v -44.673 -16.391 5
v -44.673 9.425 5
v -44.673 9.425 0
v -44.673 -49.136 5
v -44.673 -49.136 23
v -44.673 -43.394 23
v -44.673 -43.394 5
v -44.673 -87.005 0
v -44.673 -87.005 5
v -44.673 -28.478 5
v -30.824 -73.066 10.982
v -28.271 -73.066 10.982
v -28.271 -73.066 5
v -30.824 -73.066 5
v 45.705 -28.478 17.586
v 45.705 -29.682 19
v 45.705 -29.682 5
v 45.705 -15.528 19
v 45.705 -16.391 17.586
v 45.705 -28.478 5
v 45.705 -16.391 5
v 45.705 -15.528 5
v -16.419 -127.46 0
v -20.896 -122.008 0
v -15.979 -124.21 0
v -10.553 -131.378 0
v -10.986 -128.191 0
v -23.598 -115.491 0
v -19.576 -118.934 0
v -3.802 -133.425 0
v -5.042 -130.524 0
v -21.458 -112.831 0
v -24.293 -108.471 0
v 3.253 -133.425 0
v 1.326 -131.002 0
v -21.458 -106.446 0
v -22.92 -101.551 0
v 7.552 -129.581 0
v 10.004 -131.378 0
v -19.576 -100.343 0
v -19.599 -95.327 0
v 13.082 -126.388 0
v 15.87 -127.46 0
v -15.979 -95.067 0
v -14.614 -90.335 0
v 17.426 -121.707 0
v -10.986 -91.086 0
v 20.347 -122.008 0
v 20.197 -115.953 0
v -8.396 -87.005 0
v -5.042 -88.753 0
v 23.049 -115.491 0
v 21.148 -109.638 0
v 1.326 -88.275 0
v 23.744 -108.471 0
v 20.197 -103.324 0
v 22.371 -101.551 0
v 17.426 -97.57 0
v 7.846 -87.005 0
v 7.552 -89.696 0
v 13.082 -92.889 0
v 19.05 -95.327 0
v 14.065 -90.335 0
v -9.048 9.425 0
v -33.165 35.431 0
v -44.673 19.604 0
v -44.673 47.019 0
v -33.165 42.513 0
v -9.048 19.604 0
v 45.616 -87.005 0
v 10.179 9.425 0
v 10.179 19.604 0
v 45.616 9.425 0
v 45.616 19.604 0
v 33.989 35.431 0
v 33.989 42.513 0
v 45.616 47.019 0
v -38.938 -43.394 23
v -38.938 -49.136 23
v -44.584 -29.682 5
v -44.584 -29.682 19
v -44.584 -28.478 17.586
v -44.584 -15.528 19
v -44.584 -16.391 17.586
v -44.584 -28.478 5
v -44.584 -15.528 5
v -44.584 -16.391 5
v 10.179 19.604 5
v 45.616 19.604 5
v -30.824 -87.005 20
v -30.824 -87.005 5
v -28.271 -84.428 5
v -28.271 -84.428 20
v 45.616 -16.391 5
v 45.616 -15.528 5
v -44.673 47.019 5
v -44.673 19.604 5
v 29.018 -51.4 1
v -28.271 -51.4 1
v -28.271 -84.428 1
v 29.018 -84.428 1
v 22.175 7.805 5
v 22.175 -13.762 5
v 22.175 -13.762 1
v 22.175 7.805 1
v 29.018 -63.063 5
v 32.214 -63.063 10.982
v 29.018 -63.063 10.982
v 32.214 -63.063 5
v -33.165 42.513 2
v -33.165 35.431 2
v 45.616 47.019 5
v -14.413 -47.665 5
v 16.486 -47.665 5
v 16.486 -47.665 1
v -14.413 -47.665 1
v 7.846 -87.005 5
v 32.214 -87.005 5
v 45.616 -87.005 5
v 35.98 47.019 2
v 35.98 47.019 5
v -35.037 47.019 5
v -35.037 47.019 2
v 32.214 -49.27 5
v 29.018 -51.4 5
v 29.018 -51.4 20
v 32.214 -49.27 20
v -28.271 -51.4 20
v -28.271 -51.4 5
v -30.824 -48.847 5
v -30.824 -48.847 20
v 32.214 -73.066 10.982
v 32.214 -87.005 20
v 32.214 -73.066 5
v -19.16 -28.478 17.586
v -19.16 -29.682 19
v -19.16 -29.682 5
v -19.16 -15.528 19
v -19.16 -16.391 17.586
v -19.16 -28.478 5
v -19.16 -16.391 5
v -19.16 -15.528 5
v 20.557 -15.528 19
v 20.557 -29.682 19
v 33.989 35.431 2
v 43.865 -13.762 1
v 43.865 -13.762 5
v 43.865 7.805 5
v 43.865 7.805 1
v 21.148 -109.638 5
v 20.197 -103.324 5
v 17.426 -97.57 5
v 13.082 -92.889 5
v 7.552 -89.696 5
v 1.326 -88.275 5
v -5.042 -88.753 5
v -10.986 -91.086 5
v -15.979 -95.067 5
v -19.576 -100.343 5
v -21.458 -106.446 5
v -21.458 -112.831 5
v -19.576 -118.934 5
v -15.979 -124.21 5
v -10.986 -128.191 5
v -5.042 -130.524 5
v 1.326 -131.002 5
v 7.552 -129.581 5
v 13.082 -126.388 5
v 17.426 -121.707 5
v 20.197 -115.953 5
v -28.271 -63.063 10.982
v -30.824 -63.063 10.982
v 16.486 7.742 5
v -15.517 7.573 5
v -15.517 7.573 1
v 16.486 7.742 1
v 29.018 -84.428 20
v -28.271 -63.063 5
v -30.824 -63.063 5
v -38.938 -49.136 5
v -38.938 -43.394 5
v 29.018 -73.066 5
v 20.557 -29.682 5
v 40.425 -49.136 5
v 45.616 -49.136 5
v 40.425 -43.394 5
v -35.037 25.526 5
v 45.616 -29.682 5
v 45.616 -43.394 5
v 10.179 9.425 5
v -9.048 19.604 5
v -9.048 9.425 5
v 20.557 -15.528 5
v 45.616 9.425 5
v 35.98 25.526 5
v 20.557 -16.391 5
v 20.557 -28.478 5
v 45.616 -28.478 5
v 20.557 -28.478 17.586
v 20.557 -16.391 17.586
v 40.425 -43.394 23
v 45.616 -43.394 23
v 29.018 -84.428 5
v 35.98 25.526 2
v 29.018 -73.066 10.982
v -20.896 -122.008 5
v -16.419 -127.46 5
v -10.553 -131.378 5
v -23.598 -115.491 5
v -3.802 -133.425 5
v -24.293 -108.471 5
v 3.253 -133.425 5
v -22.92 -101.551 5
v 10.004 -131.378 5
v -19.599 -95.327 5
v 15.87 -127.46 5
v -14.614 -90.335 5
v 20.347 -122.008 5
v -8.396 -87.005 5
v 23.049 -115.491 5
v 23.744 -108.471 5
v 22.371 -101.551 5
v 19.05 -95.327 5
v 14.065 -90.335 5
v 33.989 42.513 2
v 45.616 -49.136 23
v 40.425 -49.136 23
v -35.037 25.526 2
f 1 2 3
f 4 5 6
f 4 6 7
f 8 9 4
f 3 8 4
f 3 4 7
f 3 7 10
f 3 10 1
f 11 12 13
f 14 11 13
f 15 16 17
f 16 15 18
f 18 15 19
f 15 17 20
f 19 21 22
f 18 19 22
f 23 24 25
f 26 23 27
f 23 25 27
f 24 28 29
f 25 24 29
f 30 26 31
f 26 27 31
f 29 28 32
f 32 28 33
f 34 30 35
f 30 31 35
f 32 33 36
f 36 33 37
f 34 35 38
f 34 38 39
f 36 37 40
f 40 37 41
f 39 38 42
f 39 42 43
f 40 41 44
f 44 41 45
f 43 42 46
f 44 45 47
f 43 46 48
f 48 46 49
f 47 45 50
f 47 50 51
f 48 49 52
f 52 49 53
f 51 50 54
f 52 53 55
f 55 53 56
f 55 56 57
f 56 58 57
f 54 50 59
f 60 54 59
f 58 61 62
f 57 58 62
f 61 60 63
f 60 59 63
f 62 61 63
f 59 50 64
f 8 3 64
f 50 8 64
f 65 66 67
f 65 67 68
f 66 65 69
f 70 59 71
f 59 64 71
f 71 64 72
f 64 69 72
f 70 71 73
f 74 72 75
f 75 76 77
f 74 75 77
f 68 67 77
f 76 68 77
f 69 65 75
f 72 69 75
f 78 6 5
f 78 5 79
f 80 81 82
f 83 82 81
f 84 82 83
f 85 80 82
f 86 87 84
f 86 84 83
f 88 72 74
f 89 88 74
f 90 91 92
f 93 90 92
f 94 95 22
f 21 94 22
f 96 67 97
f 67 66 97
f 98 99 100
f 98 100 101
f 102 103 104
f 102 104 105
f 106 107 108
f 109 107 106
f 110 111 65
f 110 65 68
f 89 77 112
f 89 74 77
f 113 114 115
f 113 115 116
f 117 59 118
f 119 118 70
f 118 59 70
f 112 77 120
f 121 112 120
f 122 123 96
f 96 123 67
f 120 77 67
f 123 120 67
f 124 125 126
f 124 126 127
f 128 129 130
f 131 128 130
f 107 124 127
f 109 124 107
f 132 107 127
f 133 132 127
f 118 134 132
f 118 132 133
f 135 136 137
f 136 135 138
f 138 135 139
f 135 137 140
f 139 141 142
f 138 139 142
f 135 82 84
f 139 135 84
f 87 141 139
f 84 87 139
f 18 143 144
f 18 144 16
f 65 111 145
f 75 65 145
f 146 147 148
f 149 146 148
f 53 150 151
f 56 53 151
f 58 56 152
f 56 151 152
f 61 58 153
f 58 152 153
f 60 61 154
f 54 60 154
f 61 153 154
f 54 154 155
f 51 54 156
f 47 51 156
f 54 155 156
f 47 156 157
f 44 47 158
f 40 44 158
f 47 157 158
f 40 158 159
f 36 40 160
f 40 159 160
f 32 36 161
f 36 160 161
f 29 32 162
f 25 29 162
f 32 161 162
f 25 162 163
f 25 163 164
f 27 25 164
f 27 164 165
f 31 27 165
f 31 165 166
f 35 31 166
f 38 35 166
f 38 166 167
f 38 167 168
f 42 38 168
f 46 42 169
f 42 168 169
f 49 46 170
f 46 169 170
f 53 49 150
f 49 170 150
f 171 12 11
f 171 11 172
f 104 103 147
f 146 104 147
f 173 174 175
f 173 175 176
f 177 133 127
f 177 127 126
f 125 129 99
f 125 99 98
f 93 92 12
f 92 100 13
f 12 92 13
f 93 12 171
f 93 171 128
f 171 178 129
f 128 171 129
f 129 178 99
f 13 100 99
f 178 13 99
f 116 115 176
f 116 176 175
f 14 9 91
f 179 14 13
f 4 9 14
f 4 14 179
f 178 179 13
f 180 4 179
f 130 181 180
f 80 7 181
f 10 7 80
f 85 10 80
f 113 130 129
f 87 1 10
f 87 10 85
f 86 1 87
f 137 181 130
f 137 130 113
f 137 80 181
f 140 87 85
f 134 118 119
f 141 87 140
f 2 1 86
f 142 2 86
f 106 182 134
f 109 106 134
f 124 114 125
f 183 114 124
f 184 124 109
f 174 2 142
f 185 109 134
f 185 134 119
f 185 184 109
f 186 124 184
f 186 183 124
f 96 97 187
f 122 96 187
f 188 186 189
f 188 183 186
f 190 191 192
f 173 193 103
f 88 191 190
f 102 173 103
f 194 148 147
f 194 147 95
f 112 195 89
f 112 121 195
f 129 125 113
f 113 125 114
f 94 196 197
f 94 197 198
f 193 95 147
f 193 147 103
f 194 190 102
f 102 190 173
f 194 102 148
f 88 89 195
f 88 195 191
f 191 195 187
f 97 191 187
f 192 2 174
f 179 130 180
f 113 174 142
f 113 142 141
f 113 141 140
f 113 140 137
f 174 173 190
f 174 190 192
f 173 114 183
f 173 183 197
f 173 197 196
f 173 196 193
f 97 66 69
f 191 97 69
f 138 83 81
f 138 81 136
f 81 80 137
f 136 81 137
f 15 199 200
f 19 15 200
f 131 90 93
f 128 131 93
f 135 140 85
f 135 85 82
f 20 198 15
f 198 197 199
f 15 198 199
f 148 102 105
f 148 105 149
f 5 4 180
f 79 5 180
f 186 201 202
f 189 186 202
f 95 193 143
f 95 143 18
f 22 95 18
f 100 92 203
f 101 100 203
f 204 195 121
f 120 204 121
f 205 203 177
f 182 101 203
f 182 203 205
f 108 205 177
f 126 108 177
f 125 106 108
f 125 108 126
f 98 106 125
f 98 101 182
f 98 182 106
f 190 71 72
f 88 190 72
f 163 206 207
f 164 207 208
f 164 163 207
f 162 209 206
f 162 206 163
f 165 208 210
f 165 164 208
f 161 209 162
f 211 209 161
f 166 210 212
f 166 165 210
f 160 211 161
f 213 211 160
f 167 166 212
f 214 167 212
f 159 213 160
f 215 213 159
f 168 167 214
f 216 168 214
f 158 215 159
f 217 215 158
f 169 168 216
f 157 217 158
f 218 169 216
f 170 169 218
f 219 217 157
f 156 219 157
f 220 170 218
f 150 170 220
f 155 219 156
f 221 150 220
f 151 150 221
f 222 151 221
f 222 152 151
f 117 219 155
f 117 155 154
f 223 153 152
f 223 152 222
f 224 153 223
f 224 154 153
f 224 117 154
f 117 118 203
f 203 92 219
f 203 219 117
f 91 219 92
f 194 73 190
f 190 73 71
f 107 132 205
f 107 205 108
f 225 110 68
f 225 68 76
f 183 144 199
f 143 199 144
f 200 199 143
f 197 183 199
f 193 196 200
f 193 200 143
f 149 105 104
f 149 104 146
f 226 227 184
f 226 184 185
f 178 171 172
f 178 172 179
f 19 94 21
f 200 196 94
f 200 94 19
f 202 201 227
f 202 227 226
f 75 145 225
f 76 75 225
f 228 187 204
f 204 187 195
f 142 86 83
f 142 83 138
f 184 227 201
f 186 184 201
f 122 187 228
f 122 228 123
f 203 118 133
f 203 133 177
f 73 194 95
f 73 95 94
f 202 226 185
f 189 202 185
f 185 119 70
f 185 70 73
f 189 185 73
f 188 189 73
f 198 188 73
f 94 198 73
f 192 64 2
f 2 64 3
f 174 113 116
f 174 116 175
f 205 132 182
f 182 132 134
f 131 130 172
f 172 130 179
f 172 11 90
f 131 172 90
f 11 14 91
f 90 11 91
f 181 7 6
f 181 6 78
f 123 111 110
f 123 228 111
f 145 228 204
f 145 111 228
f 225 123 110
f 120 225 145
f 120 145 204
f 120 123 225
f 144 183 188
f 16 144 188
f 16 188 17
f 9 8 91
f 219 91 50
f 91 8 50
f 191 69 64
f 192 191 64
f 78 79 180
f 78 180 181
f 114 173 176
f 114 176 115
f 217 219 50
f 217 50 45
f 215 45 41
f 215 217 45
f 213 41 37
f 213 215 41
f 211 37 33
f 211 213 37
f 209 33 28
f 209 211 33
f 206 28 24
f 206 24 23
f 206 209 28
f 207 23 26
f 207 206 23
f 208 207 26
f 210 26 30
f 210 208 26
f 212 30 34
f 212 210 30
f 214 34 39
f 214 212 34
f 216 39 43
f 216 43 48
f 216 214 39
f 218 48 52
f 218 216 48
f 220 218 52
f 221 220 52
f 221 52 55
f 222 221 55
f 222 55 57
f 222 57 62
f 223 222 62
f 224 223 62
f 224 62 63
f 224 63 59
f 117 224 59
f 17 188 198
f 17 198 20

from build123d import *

# Parameters (mm, degrees)
BASE_SEGUIDOR_DEPTH        = 5
RESIZE_BASE_BY             = 10.718934909
RESIZE_BASE_2_BY           = 6.304160727
MOVER_START                = -87.004758572
MOVER_FACE10_OUTLINE_W     = 90.28944226
MOVER_FACE10_OUTLINE_H     = 5
MOVER_FACE10_DEPTH         = 4.845951812
ESBO_O27_W                 = 5.735972996
ESBO_O27_H                 = 5.741390801
ESBO_O27_W_2               = 5.190846063
BASE_ENGERENAGEM_DEPTH     = 18
ESBO_O18_R                 = 24.046540625
ESBO_O18_R_2               = 21.423073694
RESSALTO_EXTRUS_O11_DEPTH  = 5
ESBO_O22_W                 = 57.28918899
ESBO_O22_H                 = 33.028358432
CORTE_EXTRUS_O2_DEPTH      = 4
RESSALTO_EXTRUS_O12_DEPTH  = 15
ESBO_O26_W                 = 5.982118077
ESBO_O26_H                 = 10.002665269
CORTE_EXTRUS_O3_DEPTH      = 64
ESBO_O6_W                  = 25.148684125
ESBO_O6_H                  = 14.153877123
ESBO_O6_W_2                = 25.424126456
RESSALTO_EXTRUS_O10_DEPTH  = 14
ESBO_O19_W                 = 12.585961191
ESBO_O19_H                 = 12.087029767
CORTE_EXTRUS_O1_DEPTH      = 92
ESBO_O4_W                  = 21.689466083
ESBO_O4_H                  = 21.567386105
PCB_BURACOS_DEPTH          = 4
ESBO_O2_W                  = 71.017341725
ESBO_O2_H                  = 21.492860186
SENSOR_INFRA_ENCAIXE_DEPTH = 3
ESBO_O9_W                  = 67.154361664
ESBO_O9_H                  = 7.082446002
FURO_SENSOR_DEPTH          = 10


# Read off the part's stored shape, not the designer's step: Mover face10
with BuildPart() as part:
    # Esboço1 → base_seguidor (new body)
    with BuildSketch(Plane.XY):
        Polygon((-44.67348187, 40.715072084), (-44.67348187, 19.603553226), (-9.047793796, 19.603553226), (-9.047793796, 9.424785205), (-44.67348187, 9.424785205), (-44.67348187, -71.439871851), (45.61596039, -71.439871851), (45.61596039, 9.424785205), (10.178768021, 9.424785205), (10.178768021, 19.603553226), (45.61596039, 19.603553226), (45.61596039, 40.715072084), align=None)
    extrude(amount=BASE_SEGUIDOR_DEPTH)

    # resize_base: a face moved outward by 10.718935
    extrude(part.faces().sort_by_distance((0.47123926, -71.439871851, 2.5))[0], amount=RESIZE_BASE_BY, dir=(0, -1, 0))

    # resize_base_2: a face moved outward by 6.304161
    extrude(part.faces().sort_by_distance((0.47123926, 40.715072084, 2.5))[0], amount=RESIZE_BASE_2_BY, dir=(0, 1, 0))

    # Mover face10 outline → Mover face10 (add)
    with BuildSketch(Plane(origin=(0, 0, 0), x_dir=(1, 0, 0), z_dir=(0, 1, 0)).offset(MOVER_START)):
        with Locations((0.47123926, -2.5)):
            Rectangle(MOVER_FACE10_OUTLINE_W, MOVER_FACE10_OUTLINE_H)
    extrude(amount=MOVER_FACE10_DEPTH)

    # Esboço27 → base_engerenagem (add)
    with BuildSketch(Plane.XY.offset(5)):
        with Locations((-41.805495372, -46.264886582)):
            Rectangle(ESBO_O27_W, ESBO_O27_H)
        with Locations((43.020537359, -46.264886582)):
            Rectangle(ESBO_O27_W_2, ESBO_O27_H)
    extrude(amount=BASE_ENGERENAGEM_DEPTH)

    # Esboço18 → Ressalto-extrusão11 (add)
    with BuildSketch(Plane.XY.offset(5)):
        with Locations((-0.274583628, -109.638466508)):
            Circle(ESBO_O18_R)
        with Locations((-0.274583628, -109.638466508)):
            Circle(ESBO_O18_R_2, mode=Mode.SUBTRACT)
    extrude(amount=-RESSALTO_EXTRUS_O11_DEPTH)

    # Esboço22 → Corte-extrusão2 (cut)
    with BuildSketch(Plane.XY.offset(5)):
        with Locations((0.373700248, -67.914265776)):
            Rectangle(ESBO_O22_W, ESBO_O22_H)
    extrude(amount=-CORTE_EXTRUS_O2_DEPTH, mode=Mode.SUBTRACT)

    # Esboço24 → Ressalto-extrusão12 (add)
    with BuildSketch(Plane.XY.offset(5)):
        Polygon((-28.270894247, -51.40008656), (-30.823687143, -48.847293665), (-30.823687143, -87.004758572), (-28.270894247, -84.428444992), align=None)
        Polygon((29.018294743, -51.40008656), (32.214208361, -49.269582228), (32.214208361, -87.004758572), (29.018294743, -84.428444992), align=None)
    extrude(amount=RESSALTO_EXTRUS_O12_DEPTH)

    # Esboço26 → Corte-extrusão3 (cut)
    with BuildSketch(Plane(origin=(32.214208361, 0, 0), x_dir=(0, 0, -1), z_dir=(1, 0, 0))):
        with Locations((-7.991059039, -68.064198105)):
            Rectangle(ESBO_O26_W, ESBO_O26_H)
    extrude(amount=-CORTE_EXTRUS_O3_DEPTH, mode=Mode.SUBTRACT)

    # Esboço6 → Ressalto-extrusão10 (add)
    with BuildSketch(Plane.XY.offset(5)):
        with Locations((33.131077051, -22.60517657)):
            Rectangle(ESBO_O6_W, ESBO_O6_H)
        with Locations((-31.871959919, -22.60517657)):
            Rectangle(ESBO_O6_W_2, ESBO_O6_H)
    extrude(amount=RESSALTO_EXTRUS_O10_DEPTH)

    # Esboço19 → Corte-extrusão1 (cut)
    with BuildSketch(Plane.ZY.offset(44.67348187)):
        with Locations((11.292980596, -22.434877547)):
            Rectangle(ESBO_O19_W, ESBO_O19_H)
    extrude(amount=-CORTE_EXTRUS_O1_DEPTH, mode=Mode.SUBTRACT)

    # Esboço4 → pcb_buracos (cut)
    with BuildSketch(Plane.XY.offset(5)):
        Polygon((-15.516819289, 7.573140349), (16.485994782, 7.741548684), (16.485994782, -47.664793519), (-14.412520449, -47.664793519), align=None)
        with Locations((33.019910346, -2.978526461)):
            Rectangle(ESBO_O4_W, ESBO_O4_H)
    extrude(amount=-PCB_BURACOS_DEPTH, mode=Mode.SUBTRACT)

    # Esboço2 → sensor_infra_encaixe (cut)
    with BuildSketch(Plane.XY.offset(5)):
        with Locations((0.47123926, 36.272802718)):
            Rectangle(ESBO_O2_W, ESBO_O2_H)
    extrude(amount=-SENSOR_INFRA_ENCAIXE_DEPTH, mode=Mode.SUBTRACT)

    # Esboço9 → furo_sensor (cut)
    with BuildSketch(Plane.XY.offset(2)):
        with Locations((0.411915335, 38.971892304)):
            Rectangle(ESBO_O9_W, ESBO_O9_H)
    extrude(amount=-FURO_SENSOR_DEPTH, mode=Mode.SUBTRACT)


solid = part.part
